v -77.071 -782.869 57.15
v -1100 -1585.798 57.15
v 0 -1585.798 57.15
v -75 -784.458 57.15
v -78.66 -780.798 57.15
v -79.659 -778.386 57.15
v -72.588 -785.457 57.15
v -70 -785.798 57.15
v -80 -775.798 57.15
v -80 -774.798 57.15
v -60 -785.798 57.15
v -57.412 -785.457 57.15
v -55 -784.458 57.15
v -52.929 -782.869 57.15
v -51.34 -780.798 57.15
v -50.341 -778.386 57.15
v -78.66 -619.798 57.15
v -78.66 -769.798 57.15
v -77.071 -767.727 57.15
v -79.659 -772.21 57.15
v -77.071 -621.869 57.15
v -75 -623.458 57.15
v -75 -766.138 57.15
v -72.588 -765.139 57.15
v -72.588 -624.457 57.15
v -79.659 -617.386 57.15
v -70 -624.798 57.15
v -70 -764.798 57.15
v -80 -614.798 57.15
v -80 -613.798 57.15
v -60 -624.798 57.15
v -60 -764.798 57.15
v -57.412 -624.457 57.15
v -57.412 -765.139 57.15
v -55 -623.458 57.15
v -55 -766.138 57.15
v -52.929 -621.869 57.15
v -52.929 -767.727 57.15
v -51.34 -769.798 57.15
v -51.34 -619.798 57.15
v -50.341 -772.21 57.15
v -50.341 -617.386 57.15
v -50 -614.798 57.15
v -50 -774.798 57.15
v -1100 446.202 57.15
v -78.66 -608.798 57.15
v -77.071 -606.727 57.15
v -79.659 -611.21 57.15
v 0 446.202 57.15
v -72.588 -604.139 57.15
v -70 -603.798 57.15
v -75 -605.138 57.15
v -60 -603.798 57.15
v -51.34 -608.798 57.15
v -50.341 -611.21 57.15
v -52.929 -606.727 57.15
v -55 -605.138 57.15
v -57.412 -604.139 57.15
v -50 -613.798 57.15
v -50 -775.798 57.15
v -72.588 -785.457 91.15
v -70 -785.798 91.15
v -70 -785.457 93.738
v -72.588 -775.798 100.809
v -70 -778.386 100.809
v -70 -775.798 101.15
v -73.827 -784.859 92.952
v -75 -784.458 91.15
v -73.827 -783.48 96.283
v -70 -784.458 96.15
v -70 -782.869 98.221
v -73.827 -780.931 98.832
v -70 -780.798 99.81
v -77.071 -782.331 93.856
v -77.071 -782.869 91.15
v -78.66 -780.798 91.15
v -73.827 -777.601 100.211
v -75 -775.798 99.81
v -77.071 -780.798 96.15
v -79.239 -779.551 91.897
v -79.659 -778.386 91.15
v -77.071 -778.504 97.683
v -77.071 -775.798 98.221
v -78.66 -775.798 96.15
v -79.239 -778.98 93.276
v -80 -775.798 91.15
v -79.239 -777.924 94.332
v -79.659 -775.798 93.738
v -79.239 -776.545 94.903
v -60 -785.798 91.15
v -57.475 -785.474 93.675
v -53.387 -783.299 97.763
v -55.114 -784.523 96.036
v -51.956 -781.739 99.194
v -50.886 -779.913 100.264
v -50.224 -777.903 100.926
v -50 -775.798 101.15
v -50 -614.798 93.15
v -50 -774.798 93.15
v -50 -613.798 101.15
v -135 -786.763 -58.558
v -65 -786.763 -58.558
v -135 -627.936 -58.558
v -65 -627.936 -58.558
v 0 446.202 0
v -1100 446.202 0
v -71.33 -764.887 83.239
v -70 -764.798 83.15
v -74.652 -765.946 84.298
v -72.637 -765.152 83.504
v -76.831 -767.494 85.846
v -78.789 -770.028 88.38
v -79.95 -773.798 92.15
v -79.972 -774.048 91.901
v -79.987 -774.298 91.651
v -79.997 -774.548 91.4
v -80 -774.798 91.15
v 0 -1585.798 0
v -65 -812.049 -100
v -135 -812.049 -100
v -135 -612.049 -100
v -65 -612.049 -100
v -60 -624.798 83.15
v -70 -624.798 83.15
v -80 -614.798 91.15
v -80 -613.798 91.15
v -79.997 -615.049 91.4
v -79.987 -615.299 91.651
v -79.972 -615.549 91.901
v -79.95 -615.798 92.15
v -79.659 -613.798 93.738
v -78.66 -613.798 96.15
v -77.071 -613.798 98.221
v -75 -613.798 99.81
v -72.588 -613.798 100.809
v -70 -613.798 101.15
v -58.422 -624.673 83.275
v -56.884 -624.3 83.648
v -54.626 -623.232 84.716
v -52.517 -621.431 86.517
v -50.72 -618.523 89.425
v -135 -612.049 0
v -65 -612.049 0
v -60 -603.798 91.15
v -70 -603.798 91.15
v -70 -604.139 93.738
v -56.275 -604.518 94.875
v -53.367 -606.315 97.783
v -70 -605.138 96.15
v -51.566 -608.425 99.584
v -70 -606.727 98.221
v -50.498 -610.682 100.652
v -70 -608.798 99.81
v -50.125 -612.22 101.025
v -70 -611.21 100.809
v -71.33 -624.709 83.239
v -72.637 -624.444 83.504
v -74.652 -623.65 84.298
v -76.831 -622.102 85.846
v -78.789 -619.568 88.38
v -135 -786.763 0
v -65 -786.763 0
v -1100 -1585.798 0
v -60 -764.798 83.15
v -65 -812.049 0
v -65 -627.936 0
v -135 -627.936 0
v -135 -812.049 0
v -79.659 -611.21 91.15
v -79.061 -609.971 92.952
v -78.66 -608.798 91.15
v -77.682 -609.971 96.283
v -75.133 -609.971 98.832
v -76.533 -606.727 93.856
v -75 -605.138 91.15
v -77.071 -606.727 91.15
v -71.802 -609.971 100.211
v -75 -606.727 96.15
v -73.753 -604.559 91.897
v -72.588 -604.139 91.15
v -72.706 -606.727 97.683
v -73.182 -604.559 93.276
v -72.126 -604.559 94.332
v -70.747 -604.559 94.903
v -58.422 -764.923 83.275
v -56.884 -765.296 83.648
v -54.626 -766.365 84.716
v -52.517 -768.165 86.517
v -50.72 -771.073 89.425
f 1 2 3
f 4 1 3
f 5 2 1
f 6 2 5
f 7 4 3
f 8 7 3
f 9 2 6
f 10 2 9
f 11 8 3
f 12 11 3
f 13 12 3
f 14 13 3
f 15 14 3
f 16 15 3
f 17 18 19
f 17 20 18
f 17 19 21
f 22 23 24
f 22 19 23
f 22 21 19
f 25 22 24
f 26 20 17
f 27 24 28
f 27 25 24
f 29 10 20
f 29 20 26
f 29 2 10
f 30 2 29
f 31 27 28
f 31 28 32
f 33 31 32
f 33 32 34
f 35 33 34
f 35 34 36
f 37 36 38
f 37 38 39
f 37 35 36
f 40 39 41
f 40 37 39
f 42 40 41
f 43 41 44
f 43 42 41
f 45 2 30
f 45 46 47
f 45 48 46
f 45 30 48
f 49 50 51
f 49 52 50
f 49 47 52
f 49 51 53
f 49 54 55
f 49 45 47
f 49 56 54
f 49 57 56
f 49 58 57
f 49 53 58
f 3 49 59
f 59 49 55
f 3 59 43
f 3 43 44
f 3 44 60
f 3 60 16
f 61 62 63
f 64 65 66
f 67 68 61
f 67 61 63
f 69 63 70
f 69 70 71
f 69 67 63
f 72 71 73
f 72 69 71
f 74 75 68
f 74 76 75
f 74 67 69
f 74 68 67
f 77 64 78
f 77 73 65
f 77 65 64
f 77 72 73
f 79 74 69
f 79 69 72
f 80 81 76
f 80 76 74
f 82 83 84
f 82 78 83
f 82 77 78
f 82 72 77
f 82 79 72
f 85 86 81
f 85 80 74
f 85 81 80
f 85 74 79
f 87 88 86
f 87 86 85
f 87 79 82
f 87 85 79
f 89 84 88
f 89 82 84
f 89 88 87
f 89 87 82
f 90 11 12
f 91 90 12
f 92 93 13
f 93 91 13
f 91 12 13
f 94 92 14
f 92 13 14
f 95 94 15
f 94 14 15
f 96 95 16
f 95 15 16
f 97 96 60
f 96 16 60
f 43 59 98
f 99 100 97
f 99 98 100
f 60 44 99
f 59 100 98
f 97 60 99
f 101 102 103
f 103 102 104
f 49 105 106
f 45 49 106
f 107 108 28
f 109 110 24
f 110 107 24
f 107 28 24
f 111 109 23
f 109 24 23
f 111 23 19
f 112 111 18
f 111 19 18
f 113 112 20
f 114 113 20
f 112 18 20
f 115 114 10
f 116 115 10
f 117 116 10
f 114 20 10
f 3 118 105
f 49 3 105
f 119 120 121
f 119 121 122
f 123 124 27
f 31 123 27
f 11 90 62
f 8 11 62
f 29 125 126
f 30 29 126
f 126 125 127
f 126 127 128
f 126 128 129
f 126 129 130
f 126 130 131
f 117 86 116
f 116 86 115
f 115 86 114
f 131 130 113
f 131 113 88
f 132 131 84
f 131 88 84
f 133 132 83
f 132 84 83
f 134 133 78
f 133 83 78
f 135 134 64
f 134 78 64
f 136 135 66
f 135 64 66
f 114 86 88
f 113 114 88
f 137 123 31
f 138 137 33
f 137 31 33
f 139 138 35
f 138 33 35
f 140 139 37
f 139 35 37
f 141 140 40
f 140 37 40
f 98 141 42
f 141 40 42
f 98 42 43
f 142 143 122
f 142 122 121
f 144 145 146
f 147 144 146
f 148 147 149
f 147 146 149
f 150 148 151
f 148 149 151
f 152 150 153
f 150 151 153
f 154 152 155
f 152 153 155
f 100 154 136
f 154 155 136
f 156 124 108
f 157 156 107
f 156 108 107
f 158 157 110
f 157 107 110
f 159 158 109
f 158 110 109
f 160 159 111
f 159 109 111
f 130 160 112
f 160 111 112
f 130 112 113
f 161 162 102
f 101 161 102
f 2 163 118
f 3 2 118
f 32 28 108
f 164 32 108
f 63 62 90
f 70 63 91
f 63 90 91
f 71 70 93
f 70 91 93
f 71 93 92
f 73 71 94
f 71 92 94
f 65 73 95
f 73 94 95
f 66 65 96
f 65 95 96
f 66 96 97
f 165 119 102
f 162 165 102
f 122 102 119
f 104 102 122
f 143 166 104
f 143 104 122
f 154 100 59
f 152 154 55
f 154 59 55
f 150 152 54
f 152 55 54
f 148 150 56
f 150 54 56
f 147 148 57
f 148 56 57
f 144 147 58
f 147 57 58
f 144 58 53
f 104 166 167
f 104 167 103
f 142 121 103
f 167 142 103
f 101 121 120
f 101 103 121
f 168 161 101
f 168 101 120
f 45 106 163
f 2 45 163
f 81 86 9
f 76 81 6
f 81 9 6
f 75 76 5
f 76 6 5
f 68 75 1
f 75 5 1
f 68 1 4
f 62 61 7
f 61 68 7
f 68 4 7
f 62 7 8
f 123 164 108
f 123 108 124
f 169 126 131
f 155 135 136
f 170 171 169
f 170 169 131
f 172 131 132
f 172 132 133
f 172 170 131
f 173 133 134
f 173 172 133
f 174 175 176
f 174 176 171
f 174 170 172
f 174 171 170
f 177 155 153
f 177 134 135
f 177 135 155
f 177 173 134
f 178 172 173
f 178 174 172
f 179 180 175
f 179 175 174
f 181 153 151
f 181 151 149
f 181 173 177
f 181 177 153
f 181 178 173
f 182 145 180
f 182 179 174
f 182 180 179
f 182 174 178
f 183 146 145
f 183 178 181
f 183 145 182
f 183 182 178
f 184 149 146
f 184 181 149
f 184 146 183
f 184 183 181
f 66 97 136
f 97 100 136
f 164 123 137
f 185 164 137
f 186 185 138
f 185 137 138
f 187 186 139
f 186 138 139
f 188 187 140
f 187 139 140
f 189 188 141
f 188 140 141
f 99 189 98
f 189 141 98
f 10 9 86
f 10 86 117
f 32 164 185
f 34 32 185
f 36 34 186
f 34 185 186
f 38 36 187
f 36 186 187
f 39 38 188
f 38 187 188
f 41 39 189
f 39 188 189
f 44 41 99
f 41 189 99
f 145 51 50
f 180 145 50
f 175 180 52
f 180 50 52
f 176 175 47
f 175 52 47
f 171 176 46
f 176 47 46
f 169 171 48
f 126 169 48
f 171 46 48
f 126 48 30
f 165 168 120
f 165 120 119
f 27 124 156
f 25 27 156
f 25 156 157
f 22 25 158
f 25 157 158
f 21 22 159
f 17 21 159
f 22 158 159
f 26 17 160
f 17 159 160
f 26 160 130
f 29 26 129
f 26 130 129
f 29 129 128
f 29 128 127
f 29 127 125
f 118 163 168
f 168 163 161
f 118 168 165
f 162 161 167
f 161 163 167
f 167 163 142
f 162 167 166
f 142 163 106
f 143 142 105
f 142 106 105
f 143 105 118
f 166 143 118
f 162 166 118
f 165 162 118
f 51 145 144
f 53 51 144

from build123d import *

# Parameters (mm, degrees)
BOSS_EXTRUDE2_DEPTH = 57.15
BOSS_EXTRUDE3_DEPTH = 44
CUT_EXTRUDE1_DEPTH  = 44
FILLET1_R           = 10
BOSS_EXTRUDE4_DEPTH = 100
SKETCH8_W           = 58.558244651631945
SKETCH8_H           = 158.82756414249673
CUT_EXTRUDE3_DEPTH  = 70


with BuildPart() as part:
    # Sketch1 → Boss-Extrude2 (new body)
    with BuildSketch(Plane.XY):
        Polygon((0, 0), (0, 446.2018372120283), (-1100, 446.2018372120282), (-1100, -1585.7981627879717), (0, -1585.7981627879717), align=None)
    extrude(amount=BOSS_EXTRUDE2_DEPTH)

    # Sketch4 → Boss-Extrude3 (add)
    with BuildSketch(Plane.XY.offset(57.15)):
        Polygon((-79.99999999999993, -603.7981627879718), (-49.999999999999936, -603.7981627879718), (-49.999999999999915, -785.7981627879718), (-79.9999999999999, -785.7981627879718), align=None)
    extrude(amount=BOSS_EXTRUDE3_DEPTH)

    # Sketch5 → Cut-Extrude1 (cut)
    with BuildSketch(Plane.ZY.offset(80.00000000000003)):
        Polygon((83.14999999999999, -624.7981627879717), (57.150000000000006, -624.7981627879717), (57.15, -764.7981627879717), (83.15, -764.7981627879717), align=None)
    extrude(amount=-CUT_EXTRUDE1_DEPTH, mode=Mode.SUBTRACT)

    # Fillet1
    # the kernel refuses this fillet: 10 mm, written as the material it takes off along each edge
    with BuildSketch(Plane(origin=(-69.99999999999993, -613.7981627879718, 91.15), x_dir=(-1, -1.6e-16, 0), z_dir=(0, 1, 0))) as fillet1_piece_1_section:
        Polygon((0, 0), (FILLET1_R, 0), (FILLET1_R, FILLET1_R), (0, FILLET1_R), align=None)
    fillet1_piece_1 = extrude(amount=FILLET1_R, mode=Mode.PRIVATE)
    fillet1_piece_1 = fillet1_piece_1 - Plane(origin=(-69.99999999999993, -613.7981627879718, 91.15), x_dir=(0.7071067811865475, 0, -0.7071067811865475), z_dir=(0, 1, 0)) * Sphere(FILLET1_R, mode=Mode.PRIVATE)
    add(fillet1_piece_1, mode=Mode.SUBTRACT)
    with BuildSketch(Plane(origin=(-69.9999999999999, -775.7981627879718, 91.15), x_dir=(0, 0, 1), z_dir=(-1, -1.6e-16, 0))) as fillet1_piece_2_section:
        Polygon((0, 0), (FILLET1_R, 0), (FILLET1_R, -FILLET1_R), (0, -FILLET1_R), align=None)
    fillet1_piece_2 = extrude(amount=FILLET1_R, mode=Mode.PRIVATE)
    fillet1_piece_2 = fillet1_piece_2 - Plane(origin=(-69.9999999999999, -775.7981627879718, 91.15), x_dir=(0, 0.7071067811865475, -0.7071067811865475), z_dir=(-1, -1.6e-16, 0)) * Sphere(FILLET1_R, mode=Mode.PRIVATE)
    add(fillet1_piece_2, mode=Mode.SUBTRACT)
    with BuildSketch(Plane(origin=(-49.999999999999915, -785.7981627879718, 57.15), x_dir=(-1, 0, 0), z_dir=(0, 0, 1))) as fillet1_piece_3:
        with BuildLine():
            CenterArc((FILLET1_R, -FILLET1_R), FILLET1_R, 90, 90)
            Line((0, -FILLET1_R), (0, 0))
            Line((0, 0), (FILLET1_R, 0))
        make_face()
    extrude(amount=69, mode=Mode.SUBTRACT)
    with BuildSketch(Plane(origin=(-49.999999999999936, -603.7981627879718, 57.15), x_dir=(0, -1, 0), z_dir=(0, 0, 1))) as fillet1_piece_4:
        with BuildLine():
            CenterArc((FILLET1_R, -FILLET1_R), FILLET1_R, 90, 90)
            Line((0, -FILLET1_R), (0, 0))
            Line((0, 0), (FILLET1_R, 0))
        make_face()
    extrude(amount=69, mode=Mode.SUBTRACT)
    with BuildSketch(Plane(origin=(-79.99999999999993, -603.7981627879718, 57.15), x_dir=(1, 0, 0), z_dir=(0, 0, 1))) as fillet1_piece_5:
        with BuildLine():
            CenterArc((FILLET1_R, -FILLET1_R), FILLET1_R, 90, 90)
            Line((0, -FILLET1_R), (0, 0))
            Line((0, 0), (FILLET1_R, 0))
        make_face()
    extrude(amount=34.00000000000001, mode=Mode.SUBTRACT)
    with BuildSketch(Plane(origin=(-79.9999999999999, -785.7981627879718, 57.15), x_dir=(1, 0, 0), z_dir=(0, 0, 1))) as fillet1_piece_6:
        with BuildLine():
            CenterArc((FILLET1_R, FILLET1_R), FILLET1_R, 180, 90)
            Line((0, FILLET1_R), (0, 0))
            Line((0, 0), (FILLET1_R, 0))
        make_face()
    extrude(amount=34.00000000000001, mode=Mode.SUBTRACT)
    with BuildSketch(Plane(origin=(-69.99999999999993, -603.7981627879718, 101.15), x_dir=(0, 0, -1), z_dir=(1, 0, 0))) as fillet1_piece_7:
        with BuildLine():
            CenterArc((FILLET1_R, -FILLET1_R), FILLET1_R, 90, 90)
            Line((0, -FILLET1_R), (0, 0))
            Line((0, 0), (FILLET1_R, 0))
        make_face()
    extrude(amount=44.99999999999999, mode=Mode.SUBTRACT)
    with BuildSketch(Plane(origin=(-79.9999999999999, -775.7981627879718, 101.15), x_dir=(0, 0, -1), z_dir=(-1.6e-16, 1, 0))) as fillet1_piece_8:
        with BuildLine():
            CenterArc((FILLET1_R, -FILLET1_R), FILLET1_R, 90, 90)
            Line((0, -FILLET1_R), (0, 0))
            Line((0, 0), (FILLET1_R, 0))
        make_face()
    extrude(amount=162, mode=Mode.SUBTRACT)
    with BuildSketch(Plane(origin=(-24.999999999999915, -785.7981627879718, 101.15), x_dir=(0, 0, -1), z_dir=(-1, 0, 0))) as fillet1_piece_9:
        with BuildLine():
            CenterArc((FILLET1_R, -FILLET1_R), FILLET1_R, 90, 90)
            Line((0, -FILLET1_R), (0, 0))
            Line((0, 0), (FILLET1_R, 0))
        make_face()
    extrude(amount=44.999999999999986, mode=Mode.SUBTRACT)
    with BuildSketch(Plane(origin=(-79.99999999999991, -764.7981627879717, 57.15000000000002), x_dir=(1.42e-15, -1, 0), z_dir=(0, 0, 1))) as fillet1_piece_10:
        with BuildLine():
            CenterArc((FILLET1_R, FILLET1_R), FILLET1_R, 180, 89.99999999999989)
            Line((1.421e-14, FILLET1_R), (0, 0))
            Line((0, 0), (FILLET1_R, 0))
        make_face()
    extrude(amount=25.999999999999986, mode=Mode.SUBTRACT)
    with BuildSketch(Plane(origin=(-79.99999999999993, -624.7981627879717, 83.14999999999999), x_dir=(0, 1, 0), z_dir=(0, 0, -1))) as fillet1_piece_11:
        with BuildLine():
            CenterArc((FILLET1_R, FILLET1_R), FILLET1_R, 180, 90)
            Line((0, FILLET1_R), (0, 0))
            Line((0, 0), (FILLET1_R, 0))
        make_face()
    extrude(amount=25.999999999999986, mode=Mode.SUBTRACT)
    with BuildSketch(Plane(origin=(-79.99999999999991, -764.7981627879717, 83.15), x_dir=(1.42e-15, 1e-16, 1), z_dir=(-1.5e-16, 1, -1e-16))) as fillet1_piece_12:
        with BuildLine():
            CenterArc((FILLET1_R, FILLET1_R), FILLET1_R, 180, 89.99999999999989)
            Line((1.421e-14, FILLET1_R), (0, 0))
            Line((0, 0), (FILLET1_R, 0))
        make_face()
    extrude(amount=140, mode=Mode.SUBTRACT)
    with BuildSketch(Plane(origin=(-49.999999999999915, -764.7981627879717, 83.15), x_dir=(0, -1, 0), z_dir=(0, 0, -1))) as fillet1_piece_13:
        with BuildLine():
            CenterArc((FILLET1_R, FILLET1_R), FILLET1_R, 180, 90)
            Line((0, FILLET1_R), (0, 0))
            Line((0, 0), (FILLET1_R, 0))
        make_face()
    extrude(amount=26, mode=Mode.SUBTRACT)
    with BuildSketch(Plane(origin=(-49.999999999999936, -624.7981627879717, 57.150000000000006), x_dir=(0, 1, 0), z_dir=(0, 0, 1))) as fillet1_piece_14:
        with BuildLine():
            CenterArc((FILLET1_R, FILLET1_R), FILLET1_R, 180.00000000000003, 90)
            Line((0, FILLET1_R), (0, 0))
            Line((0, 0), (FILLET1_R, 0))
        make_face()
    extrude(amount=25.999999999999986, mode=Mode.SUBTRACT)
    with BuildSketch(Plane(origin=(-49.999999999999936, -624.7981627879717, 83.15), x_dir=(0, 1e-16, 1), z_dir=(1.2e-16, -1, 1e-16))) as fillet1_piece_15:
        with BuildLine():
            CenterArc((FILLET1_R, FILLET1_R), FILLET1_R, 180, 90)
            Line((0, FILLET1_R), (0, 0))
            Line((0, 0), (FILLET1_R, 0))
        make_face()
    extrude(amount=140, mode=Mode.SUBTRACT)
    with BuildSketch(Plane(origin=(-79.99999999999991, -764.7981627879717, 57.15000000000002), x_dir=(1.42e-15, -1, 0), z_dir=(0, 0, 1))) as fillet1_piece_16a_section:
        with BuildLine():
            CenterArc((FILLET1_R, FILLET1_R), FILLET1_R, 180, 89.99999999999989)
            Line((1.421e-14, FILLET1_R), (0, 0))
            Line((0, 0), (FILLET1_R, 0))
        make_face()
    fillet1_piece_16a = extrude(amount=50.999999999999986, mode=Mode.PRIVATE)
    fillet1_piece_16a = split(fillet1_piece_16a, bisect_by=Plane(origin=(-77.7360488573316, -767.0621139306398, 83.15), z_dir=(0, 1e-16, 1)), keep=Keep.TOP, mode=Mode.PRIVATE)
    with BuildSketch(Plane(origin=(-79.9999999999999, -789.7981627879717, 83.15), x_dir=(0, 1e-16, 1), z_dir=(-1.5e-16, 1, -1e-16))) as fillet1_piece_16b_section:
        with BuildLine():
            CenterArc((FILLET1_R, FILLET1_R), FILLET1_R, 180, 90)
            Line((0, FILLET1_R), (0, 0))
            Line((0, 0), (FILLET1_R, 0))
        make_face()
    fillet1_piece_16b = extrude(amount=165, mode=Mode.PRIVATE)
    fillet1_piece_16b = split(fillet1_piece_16b, bisect_by=Plane(origin=(-77.73604885733165, -764.7981627879717, 85.41395114266827), z_dir=(1.5e-16, -1, 0)), keep=Keep.TOP, mode=Mode.PRIVATE)
    fillet1_piece_16 = fillet1_piece_16a & fillet1_piece_16b
    add(fillet1_piece_16, mode=Mode.SUBTRACT)
    with BuildSketch(Plane(origin=(-79.99999999999991, -764.7981627879717, 83.15), x_dir=(1.42e-15, 1e-16, 1), z_dir=(-1.5e-16, 1, -1e-16))) as fillet1_piece_17a_section:
        with BuildLine():
            CenterArc((FILLET1_R, FILLET1_R), FILLET1_R, 180, 89.99999999999989)
            Line((1.421e-14, FILLET1_R), (0, 0))
            Line((0, 0), (FILLET1_R, 0))
        make_face()
    fillet1_piece_17a = extrude(amount=165, mode=Mode.PRIVATE)
    fillet1_piece_17a = split(fillet1_piece_17a, bisect_by=Plane(origin=(-77.73604885733167, -624.7981627879717, 85.41395114266825), z_dir=(-1.5e-16, 1, 0)), keep=Keep.TOP, mode=Mode.PRIVATE)
    with BuildSketch(Plane(origin=(-79.99999999999993, -624.7981627879717, 108.14999999999998), x_dir=(0, 1, 0), z_dir=(0, 0, -1))) as fillet1_piece_17b_section:
        with BuildLine():
            CenterArc((FILLET1_R, FILLET1_R), FILLET1_R, 180, 90)
            Line((0, FILLET1_R), (0, 0))
            Line((0, 0), (FILLET1_R, 0))
        make_face()
    fillet1_piece_17b = extrude(amount=50.999999999999986, mode=Mode.PRIVATE)
    fillet1_piece_17b = split(fillet1_piece_17b, bisect_by=Plane(origin=(-77.73604885733164, -622.5342116453035, 83.14999999999999), z_dir=(0, 1e-16, 1)), keep=Keep.TOP, mode=Mode.PRIVATE)
    fillet1_piece_17 = fillet1_piece_17a & fillet1_piece_17b
    add(fillet1_piece_17, mode=Mode.SUBTRACT)
    with BuildSketch(Plane(origin=(-49.999999999999936, -624.7981627879717, 83.15), x_dir=(0, 1e-16, 1), z_dir=(1.2e-16, -1, 1e-16))) as fillet1_piece_18a_section:
        with BuildLine():
            CenterArc((FILLET1_R, FILLET1_R), FILLET1_R, 180, 90)
            Line((0, FILLET1_R), (0, 0))
            Line((0, 0), (FILLET1_R, 0))
        make_face()
    fillet1_piece_18a = extrude(amount=165, mode=Mode.PRIVATE)
    fillet1_piece_18a = split(fillet1_piece_18a, bisect_by=Plane(origin=(-52.26395114266817, -764.7981627879717, 85.41395114266827), z_dir=(1.5e-16, -1, 0)), keep=Keep.TOP, mode=Mode.PRIVATE)
    with BuildSketch(Plane(origin=(-49.999999999999915, -764.7981627879717, 108.15), x_dir=(0, -1, 0), z_dir=(0, 0, -1))) as fillet1_piece_18b_section:
        with BuildLine():
            CenterArc((FILLET1_R, FILLET1_R), FILLET1_R, 180, 90)
            Line((0, FILLET1_R), (0, 0))
            Line((0, 0), (FILLET1_R, 0))
        make_face()
    fillet1_piece_18b = extrude(amount=51, mode=Mode.PRIVATE)
    fillet1_piece_18b = split(fillet1_piece_18b, bisect_by=Plane(origin=(-52.2639511426682, -767.0621139306397, 83.15), z_dir=(0, 1e-16, 1)), keep=Keep.TOP, mode=Mode.PRIVATE)
    fillet1_piece_18 = fillet1_piece_18a & fillet1_piece_18b
    add(fillet1_piece_18, mode=Mode.SUBTRACT)
    with BuildSketch(Plane(origin=(-49.999999999999936, -624.7981627879717, 57.150000000000006), x_dir=(0, 1, 0), z_dir=(0, 0, 1))) as fillet1_piece_19a_section:
        with BuildLine():
            CenterArc((FILLET1_R, FILLET1_R), FILLET1_R, 180.00000000000003, 90)
            Line((0, FILLET1_R), (0, 0))
            Line((0, 0), (FILLET1_R, 0))
        make_face()
    fillet1_piece_19a = extrude(amount=50.999999999999986, mode=Mode.PRIVATE)
    fillet1_piece_19a = split(fillet1_piece_19a, bisect_by=Plane(origin=(-52.26395114266823, -622.5342116453035, 83.14999999999999), z_dir=(0, 1e-16, 1)), keep=Keep.TOP, mode=Mode.PRIVATE)
    with BuildSketch(Plane(origin=(-49.999999999999936, -599.7981627879717, 83.14999999999999), x_dir=(0, 1e-16, 1), z_dir=(1.2e-16, -1, 1e-16))) as fillet1_piece_19b_section:
        with BuildLine():
            CenterArc((FILLET1_R, FILLET1_R), FILLET1_R, 179.99999999999997, 90)
            Line((0, FILLET1_R), (0, 0))
            Line((0, 0), (FILLET1_R, 0))
        make_face()
    fillet1_piece_19b = extrude(amount=165, mode=Mode.PRIVATE)
    fillet1_piece_19b = split(fillet1_piece_19b, bisect_by=Plane(origin=(-52.26395114266818, -624.7981627879717, 85.41395114266824), z_dir=(-1.5e-16, 1, 0)), keep=Keep.TOP, mode=Mode.PRIVATE)
    fillet1_piece_19 = fillet1_piece_19a & fillet1_piece_19b
    add(fillet1_piece_19, mode=Mode.SUBTRACT)

    # Sketch6 → Boss-Extrude4 (add)
    with BuildSketch(Plane(origin=(0, 0, 0), x_dir=(-1, 0, 0), z_dir=(0, 0, -1))):
        Polygon((64.99999999999997, -612.0487005102074), (134.99999999999994, -612.0487005102074), (135, -812.0487005102073), (65, -812.0487005102073), align=None)
    extrude(amount=BOSS_EXTRUDE4_DEPTH)

    # Sketch8 → Cut-Extrude3 (cut)
    with BuildSketch(Plane(origin=(-64.99999999999989, 9.02e-15, 0), x_dir=(0, 0, -1), z_dir=(1, -1.4e-16, 0))):
        with Locations((29.279122325815973, -707.3493580183326)):
            Rectangle(SKETCH8_W, SKETCH8_H)
    extrude(amount=-CUT_EXTRUDE3_DEPTH, mode=Mode.SUBTRACT)


solid = part.part
